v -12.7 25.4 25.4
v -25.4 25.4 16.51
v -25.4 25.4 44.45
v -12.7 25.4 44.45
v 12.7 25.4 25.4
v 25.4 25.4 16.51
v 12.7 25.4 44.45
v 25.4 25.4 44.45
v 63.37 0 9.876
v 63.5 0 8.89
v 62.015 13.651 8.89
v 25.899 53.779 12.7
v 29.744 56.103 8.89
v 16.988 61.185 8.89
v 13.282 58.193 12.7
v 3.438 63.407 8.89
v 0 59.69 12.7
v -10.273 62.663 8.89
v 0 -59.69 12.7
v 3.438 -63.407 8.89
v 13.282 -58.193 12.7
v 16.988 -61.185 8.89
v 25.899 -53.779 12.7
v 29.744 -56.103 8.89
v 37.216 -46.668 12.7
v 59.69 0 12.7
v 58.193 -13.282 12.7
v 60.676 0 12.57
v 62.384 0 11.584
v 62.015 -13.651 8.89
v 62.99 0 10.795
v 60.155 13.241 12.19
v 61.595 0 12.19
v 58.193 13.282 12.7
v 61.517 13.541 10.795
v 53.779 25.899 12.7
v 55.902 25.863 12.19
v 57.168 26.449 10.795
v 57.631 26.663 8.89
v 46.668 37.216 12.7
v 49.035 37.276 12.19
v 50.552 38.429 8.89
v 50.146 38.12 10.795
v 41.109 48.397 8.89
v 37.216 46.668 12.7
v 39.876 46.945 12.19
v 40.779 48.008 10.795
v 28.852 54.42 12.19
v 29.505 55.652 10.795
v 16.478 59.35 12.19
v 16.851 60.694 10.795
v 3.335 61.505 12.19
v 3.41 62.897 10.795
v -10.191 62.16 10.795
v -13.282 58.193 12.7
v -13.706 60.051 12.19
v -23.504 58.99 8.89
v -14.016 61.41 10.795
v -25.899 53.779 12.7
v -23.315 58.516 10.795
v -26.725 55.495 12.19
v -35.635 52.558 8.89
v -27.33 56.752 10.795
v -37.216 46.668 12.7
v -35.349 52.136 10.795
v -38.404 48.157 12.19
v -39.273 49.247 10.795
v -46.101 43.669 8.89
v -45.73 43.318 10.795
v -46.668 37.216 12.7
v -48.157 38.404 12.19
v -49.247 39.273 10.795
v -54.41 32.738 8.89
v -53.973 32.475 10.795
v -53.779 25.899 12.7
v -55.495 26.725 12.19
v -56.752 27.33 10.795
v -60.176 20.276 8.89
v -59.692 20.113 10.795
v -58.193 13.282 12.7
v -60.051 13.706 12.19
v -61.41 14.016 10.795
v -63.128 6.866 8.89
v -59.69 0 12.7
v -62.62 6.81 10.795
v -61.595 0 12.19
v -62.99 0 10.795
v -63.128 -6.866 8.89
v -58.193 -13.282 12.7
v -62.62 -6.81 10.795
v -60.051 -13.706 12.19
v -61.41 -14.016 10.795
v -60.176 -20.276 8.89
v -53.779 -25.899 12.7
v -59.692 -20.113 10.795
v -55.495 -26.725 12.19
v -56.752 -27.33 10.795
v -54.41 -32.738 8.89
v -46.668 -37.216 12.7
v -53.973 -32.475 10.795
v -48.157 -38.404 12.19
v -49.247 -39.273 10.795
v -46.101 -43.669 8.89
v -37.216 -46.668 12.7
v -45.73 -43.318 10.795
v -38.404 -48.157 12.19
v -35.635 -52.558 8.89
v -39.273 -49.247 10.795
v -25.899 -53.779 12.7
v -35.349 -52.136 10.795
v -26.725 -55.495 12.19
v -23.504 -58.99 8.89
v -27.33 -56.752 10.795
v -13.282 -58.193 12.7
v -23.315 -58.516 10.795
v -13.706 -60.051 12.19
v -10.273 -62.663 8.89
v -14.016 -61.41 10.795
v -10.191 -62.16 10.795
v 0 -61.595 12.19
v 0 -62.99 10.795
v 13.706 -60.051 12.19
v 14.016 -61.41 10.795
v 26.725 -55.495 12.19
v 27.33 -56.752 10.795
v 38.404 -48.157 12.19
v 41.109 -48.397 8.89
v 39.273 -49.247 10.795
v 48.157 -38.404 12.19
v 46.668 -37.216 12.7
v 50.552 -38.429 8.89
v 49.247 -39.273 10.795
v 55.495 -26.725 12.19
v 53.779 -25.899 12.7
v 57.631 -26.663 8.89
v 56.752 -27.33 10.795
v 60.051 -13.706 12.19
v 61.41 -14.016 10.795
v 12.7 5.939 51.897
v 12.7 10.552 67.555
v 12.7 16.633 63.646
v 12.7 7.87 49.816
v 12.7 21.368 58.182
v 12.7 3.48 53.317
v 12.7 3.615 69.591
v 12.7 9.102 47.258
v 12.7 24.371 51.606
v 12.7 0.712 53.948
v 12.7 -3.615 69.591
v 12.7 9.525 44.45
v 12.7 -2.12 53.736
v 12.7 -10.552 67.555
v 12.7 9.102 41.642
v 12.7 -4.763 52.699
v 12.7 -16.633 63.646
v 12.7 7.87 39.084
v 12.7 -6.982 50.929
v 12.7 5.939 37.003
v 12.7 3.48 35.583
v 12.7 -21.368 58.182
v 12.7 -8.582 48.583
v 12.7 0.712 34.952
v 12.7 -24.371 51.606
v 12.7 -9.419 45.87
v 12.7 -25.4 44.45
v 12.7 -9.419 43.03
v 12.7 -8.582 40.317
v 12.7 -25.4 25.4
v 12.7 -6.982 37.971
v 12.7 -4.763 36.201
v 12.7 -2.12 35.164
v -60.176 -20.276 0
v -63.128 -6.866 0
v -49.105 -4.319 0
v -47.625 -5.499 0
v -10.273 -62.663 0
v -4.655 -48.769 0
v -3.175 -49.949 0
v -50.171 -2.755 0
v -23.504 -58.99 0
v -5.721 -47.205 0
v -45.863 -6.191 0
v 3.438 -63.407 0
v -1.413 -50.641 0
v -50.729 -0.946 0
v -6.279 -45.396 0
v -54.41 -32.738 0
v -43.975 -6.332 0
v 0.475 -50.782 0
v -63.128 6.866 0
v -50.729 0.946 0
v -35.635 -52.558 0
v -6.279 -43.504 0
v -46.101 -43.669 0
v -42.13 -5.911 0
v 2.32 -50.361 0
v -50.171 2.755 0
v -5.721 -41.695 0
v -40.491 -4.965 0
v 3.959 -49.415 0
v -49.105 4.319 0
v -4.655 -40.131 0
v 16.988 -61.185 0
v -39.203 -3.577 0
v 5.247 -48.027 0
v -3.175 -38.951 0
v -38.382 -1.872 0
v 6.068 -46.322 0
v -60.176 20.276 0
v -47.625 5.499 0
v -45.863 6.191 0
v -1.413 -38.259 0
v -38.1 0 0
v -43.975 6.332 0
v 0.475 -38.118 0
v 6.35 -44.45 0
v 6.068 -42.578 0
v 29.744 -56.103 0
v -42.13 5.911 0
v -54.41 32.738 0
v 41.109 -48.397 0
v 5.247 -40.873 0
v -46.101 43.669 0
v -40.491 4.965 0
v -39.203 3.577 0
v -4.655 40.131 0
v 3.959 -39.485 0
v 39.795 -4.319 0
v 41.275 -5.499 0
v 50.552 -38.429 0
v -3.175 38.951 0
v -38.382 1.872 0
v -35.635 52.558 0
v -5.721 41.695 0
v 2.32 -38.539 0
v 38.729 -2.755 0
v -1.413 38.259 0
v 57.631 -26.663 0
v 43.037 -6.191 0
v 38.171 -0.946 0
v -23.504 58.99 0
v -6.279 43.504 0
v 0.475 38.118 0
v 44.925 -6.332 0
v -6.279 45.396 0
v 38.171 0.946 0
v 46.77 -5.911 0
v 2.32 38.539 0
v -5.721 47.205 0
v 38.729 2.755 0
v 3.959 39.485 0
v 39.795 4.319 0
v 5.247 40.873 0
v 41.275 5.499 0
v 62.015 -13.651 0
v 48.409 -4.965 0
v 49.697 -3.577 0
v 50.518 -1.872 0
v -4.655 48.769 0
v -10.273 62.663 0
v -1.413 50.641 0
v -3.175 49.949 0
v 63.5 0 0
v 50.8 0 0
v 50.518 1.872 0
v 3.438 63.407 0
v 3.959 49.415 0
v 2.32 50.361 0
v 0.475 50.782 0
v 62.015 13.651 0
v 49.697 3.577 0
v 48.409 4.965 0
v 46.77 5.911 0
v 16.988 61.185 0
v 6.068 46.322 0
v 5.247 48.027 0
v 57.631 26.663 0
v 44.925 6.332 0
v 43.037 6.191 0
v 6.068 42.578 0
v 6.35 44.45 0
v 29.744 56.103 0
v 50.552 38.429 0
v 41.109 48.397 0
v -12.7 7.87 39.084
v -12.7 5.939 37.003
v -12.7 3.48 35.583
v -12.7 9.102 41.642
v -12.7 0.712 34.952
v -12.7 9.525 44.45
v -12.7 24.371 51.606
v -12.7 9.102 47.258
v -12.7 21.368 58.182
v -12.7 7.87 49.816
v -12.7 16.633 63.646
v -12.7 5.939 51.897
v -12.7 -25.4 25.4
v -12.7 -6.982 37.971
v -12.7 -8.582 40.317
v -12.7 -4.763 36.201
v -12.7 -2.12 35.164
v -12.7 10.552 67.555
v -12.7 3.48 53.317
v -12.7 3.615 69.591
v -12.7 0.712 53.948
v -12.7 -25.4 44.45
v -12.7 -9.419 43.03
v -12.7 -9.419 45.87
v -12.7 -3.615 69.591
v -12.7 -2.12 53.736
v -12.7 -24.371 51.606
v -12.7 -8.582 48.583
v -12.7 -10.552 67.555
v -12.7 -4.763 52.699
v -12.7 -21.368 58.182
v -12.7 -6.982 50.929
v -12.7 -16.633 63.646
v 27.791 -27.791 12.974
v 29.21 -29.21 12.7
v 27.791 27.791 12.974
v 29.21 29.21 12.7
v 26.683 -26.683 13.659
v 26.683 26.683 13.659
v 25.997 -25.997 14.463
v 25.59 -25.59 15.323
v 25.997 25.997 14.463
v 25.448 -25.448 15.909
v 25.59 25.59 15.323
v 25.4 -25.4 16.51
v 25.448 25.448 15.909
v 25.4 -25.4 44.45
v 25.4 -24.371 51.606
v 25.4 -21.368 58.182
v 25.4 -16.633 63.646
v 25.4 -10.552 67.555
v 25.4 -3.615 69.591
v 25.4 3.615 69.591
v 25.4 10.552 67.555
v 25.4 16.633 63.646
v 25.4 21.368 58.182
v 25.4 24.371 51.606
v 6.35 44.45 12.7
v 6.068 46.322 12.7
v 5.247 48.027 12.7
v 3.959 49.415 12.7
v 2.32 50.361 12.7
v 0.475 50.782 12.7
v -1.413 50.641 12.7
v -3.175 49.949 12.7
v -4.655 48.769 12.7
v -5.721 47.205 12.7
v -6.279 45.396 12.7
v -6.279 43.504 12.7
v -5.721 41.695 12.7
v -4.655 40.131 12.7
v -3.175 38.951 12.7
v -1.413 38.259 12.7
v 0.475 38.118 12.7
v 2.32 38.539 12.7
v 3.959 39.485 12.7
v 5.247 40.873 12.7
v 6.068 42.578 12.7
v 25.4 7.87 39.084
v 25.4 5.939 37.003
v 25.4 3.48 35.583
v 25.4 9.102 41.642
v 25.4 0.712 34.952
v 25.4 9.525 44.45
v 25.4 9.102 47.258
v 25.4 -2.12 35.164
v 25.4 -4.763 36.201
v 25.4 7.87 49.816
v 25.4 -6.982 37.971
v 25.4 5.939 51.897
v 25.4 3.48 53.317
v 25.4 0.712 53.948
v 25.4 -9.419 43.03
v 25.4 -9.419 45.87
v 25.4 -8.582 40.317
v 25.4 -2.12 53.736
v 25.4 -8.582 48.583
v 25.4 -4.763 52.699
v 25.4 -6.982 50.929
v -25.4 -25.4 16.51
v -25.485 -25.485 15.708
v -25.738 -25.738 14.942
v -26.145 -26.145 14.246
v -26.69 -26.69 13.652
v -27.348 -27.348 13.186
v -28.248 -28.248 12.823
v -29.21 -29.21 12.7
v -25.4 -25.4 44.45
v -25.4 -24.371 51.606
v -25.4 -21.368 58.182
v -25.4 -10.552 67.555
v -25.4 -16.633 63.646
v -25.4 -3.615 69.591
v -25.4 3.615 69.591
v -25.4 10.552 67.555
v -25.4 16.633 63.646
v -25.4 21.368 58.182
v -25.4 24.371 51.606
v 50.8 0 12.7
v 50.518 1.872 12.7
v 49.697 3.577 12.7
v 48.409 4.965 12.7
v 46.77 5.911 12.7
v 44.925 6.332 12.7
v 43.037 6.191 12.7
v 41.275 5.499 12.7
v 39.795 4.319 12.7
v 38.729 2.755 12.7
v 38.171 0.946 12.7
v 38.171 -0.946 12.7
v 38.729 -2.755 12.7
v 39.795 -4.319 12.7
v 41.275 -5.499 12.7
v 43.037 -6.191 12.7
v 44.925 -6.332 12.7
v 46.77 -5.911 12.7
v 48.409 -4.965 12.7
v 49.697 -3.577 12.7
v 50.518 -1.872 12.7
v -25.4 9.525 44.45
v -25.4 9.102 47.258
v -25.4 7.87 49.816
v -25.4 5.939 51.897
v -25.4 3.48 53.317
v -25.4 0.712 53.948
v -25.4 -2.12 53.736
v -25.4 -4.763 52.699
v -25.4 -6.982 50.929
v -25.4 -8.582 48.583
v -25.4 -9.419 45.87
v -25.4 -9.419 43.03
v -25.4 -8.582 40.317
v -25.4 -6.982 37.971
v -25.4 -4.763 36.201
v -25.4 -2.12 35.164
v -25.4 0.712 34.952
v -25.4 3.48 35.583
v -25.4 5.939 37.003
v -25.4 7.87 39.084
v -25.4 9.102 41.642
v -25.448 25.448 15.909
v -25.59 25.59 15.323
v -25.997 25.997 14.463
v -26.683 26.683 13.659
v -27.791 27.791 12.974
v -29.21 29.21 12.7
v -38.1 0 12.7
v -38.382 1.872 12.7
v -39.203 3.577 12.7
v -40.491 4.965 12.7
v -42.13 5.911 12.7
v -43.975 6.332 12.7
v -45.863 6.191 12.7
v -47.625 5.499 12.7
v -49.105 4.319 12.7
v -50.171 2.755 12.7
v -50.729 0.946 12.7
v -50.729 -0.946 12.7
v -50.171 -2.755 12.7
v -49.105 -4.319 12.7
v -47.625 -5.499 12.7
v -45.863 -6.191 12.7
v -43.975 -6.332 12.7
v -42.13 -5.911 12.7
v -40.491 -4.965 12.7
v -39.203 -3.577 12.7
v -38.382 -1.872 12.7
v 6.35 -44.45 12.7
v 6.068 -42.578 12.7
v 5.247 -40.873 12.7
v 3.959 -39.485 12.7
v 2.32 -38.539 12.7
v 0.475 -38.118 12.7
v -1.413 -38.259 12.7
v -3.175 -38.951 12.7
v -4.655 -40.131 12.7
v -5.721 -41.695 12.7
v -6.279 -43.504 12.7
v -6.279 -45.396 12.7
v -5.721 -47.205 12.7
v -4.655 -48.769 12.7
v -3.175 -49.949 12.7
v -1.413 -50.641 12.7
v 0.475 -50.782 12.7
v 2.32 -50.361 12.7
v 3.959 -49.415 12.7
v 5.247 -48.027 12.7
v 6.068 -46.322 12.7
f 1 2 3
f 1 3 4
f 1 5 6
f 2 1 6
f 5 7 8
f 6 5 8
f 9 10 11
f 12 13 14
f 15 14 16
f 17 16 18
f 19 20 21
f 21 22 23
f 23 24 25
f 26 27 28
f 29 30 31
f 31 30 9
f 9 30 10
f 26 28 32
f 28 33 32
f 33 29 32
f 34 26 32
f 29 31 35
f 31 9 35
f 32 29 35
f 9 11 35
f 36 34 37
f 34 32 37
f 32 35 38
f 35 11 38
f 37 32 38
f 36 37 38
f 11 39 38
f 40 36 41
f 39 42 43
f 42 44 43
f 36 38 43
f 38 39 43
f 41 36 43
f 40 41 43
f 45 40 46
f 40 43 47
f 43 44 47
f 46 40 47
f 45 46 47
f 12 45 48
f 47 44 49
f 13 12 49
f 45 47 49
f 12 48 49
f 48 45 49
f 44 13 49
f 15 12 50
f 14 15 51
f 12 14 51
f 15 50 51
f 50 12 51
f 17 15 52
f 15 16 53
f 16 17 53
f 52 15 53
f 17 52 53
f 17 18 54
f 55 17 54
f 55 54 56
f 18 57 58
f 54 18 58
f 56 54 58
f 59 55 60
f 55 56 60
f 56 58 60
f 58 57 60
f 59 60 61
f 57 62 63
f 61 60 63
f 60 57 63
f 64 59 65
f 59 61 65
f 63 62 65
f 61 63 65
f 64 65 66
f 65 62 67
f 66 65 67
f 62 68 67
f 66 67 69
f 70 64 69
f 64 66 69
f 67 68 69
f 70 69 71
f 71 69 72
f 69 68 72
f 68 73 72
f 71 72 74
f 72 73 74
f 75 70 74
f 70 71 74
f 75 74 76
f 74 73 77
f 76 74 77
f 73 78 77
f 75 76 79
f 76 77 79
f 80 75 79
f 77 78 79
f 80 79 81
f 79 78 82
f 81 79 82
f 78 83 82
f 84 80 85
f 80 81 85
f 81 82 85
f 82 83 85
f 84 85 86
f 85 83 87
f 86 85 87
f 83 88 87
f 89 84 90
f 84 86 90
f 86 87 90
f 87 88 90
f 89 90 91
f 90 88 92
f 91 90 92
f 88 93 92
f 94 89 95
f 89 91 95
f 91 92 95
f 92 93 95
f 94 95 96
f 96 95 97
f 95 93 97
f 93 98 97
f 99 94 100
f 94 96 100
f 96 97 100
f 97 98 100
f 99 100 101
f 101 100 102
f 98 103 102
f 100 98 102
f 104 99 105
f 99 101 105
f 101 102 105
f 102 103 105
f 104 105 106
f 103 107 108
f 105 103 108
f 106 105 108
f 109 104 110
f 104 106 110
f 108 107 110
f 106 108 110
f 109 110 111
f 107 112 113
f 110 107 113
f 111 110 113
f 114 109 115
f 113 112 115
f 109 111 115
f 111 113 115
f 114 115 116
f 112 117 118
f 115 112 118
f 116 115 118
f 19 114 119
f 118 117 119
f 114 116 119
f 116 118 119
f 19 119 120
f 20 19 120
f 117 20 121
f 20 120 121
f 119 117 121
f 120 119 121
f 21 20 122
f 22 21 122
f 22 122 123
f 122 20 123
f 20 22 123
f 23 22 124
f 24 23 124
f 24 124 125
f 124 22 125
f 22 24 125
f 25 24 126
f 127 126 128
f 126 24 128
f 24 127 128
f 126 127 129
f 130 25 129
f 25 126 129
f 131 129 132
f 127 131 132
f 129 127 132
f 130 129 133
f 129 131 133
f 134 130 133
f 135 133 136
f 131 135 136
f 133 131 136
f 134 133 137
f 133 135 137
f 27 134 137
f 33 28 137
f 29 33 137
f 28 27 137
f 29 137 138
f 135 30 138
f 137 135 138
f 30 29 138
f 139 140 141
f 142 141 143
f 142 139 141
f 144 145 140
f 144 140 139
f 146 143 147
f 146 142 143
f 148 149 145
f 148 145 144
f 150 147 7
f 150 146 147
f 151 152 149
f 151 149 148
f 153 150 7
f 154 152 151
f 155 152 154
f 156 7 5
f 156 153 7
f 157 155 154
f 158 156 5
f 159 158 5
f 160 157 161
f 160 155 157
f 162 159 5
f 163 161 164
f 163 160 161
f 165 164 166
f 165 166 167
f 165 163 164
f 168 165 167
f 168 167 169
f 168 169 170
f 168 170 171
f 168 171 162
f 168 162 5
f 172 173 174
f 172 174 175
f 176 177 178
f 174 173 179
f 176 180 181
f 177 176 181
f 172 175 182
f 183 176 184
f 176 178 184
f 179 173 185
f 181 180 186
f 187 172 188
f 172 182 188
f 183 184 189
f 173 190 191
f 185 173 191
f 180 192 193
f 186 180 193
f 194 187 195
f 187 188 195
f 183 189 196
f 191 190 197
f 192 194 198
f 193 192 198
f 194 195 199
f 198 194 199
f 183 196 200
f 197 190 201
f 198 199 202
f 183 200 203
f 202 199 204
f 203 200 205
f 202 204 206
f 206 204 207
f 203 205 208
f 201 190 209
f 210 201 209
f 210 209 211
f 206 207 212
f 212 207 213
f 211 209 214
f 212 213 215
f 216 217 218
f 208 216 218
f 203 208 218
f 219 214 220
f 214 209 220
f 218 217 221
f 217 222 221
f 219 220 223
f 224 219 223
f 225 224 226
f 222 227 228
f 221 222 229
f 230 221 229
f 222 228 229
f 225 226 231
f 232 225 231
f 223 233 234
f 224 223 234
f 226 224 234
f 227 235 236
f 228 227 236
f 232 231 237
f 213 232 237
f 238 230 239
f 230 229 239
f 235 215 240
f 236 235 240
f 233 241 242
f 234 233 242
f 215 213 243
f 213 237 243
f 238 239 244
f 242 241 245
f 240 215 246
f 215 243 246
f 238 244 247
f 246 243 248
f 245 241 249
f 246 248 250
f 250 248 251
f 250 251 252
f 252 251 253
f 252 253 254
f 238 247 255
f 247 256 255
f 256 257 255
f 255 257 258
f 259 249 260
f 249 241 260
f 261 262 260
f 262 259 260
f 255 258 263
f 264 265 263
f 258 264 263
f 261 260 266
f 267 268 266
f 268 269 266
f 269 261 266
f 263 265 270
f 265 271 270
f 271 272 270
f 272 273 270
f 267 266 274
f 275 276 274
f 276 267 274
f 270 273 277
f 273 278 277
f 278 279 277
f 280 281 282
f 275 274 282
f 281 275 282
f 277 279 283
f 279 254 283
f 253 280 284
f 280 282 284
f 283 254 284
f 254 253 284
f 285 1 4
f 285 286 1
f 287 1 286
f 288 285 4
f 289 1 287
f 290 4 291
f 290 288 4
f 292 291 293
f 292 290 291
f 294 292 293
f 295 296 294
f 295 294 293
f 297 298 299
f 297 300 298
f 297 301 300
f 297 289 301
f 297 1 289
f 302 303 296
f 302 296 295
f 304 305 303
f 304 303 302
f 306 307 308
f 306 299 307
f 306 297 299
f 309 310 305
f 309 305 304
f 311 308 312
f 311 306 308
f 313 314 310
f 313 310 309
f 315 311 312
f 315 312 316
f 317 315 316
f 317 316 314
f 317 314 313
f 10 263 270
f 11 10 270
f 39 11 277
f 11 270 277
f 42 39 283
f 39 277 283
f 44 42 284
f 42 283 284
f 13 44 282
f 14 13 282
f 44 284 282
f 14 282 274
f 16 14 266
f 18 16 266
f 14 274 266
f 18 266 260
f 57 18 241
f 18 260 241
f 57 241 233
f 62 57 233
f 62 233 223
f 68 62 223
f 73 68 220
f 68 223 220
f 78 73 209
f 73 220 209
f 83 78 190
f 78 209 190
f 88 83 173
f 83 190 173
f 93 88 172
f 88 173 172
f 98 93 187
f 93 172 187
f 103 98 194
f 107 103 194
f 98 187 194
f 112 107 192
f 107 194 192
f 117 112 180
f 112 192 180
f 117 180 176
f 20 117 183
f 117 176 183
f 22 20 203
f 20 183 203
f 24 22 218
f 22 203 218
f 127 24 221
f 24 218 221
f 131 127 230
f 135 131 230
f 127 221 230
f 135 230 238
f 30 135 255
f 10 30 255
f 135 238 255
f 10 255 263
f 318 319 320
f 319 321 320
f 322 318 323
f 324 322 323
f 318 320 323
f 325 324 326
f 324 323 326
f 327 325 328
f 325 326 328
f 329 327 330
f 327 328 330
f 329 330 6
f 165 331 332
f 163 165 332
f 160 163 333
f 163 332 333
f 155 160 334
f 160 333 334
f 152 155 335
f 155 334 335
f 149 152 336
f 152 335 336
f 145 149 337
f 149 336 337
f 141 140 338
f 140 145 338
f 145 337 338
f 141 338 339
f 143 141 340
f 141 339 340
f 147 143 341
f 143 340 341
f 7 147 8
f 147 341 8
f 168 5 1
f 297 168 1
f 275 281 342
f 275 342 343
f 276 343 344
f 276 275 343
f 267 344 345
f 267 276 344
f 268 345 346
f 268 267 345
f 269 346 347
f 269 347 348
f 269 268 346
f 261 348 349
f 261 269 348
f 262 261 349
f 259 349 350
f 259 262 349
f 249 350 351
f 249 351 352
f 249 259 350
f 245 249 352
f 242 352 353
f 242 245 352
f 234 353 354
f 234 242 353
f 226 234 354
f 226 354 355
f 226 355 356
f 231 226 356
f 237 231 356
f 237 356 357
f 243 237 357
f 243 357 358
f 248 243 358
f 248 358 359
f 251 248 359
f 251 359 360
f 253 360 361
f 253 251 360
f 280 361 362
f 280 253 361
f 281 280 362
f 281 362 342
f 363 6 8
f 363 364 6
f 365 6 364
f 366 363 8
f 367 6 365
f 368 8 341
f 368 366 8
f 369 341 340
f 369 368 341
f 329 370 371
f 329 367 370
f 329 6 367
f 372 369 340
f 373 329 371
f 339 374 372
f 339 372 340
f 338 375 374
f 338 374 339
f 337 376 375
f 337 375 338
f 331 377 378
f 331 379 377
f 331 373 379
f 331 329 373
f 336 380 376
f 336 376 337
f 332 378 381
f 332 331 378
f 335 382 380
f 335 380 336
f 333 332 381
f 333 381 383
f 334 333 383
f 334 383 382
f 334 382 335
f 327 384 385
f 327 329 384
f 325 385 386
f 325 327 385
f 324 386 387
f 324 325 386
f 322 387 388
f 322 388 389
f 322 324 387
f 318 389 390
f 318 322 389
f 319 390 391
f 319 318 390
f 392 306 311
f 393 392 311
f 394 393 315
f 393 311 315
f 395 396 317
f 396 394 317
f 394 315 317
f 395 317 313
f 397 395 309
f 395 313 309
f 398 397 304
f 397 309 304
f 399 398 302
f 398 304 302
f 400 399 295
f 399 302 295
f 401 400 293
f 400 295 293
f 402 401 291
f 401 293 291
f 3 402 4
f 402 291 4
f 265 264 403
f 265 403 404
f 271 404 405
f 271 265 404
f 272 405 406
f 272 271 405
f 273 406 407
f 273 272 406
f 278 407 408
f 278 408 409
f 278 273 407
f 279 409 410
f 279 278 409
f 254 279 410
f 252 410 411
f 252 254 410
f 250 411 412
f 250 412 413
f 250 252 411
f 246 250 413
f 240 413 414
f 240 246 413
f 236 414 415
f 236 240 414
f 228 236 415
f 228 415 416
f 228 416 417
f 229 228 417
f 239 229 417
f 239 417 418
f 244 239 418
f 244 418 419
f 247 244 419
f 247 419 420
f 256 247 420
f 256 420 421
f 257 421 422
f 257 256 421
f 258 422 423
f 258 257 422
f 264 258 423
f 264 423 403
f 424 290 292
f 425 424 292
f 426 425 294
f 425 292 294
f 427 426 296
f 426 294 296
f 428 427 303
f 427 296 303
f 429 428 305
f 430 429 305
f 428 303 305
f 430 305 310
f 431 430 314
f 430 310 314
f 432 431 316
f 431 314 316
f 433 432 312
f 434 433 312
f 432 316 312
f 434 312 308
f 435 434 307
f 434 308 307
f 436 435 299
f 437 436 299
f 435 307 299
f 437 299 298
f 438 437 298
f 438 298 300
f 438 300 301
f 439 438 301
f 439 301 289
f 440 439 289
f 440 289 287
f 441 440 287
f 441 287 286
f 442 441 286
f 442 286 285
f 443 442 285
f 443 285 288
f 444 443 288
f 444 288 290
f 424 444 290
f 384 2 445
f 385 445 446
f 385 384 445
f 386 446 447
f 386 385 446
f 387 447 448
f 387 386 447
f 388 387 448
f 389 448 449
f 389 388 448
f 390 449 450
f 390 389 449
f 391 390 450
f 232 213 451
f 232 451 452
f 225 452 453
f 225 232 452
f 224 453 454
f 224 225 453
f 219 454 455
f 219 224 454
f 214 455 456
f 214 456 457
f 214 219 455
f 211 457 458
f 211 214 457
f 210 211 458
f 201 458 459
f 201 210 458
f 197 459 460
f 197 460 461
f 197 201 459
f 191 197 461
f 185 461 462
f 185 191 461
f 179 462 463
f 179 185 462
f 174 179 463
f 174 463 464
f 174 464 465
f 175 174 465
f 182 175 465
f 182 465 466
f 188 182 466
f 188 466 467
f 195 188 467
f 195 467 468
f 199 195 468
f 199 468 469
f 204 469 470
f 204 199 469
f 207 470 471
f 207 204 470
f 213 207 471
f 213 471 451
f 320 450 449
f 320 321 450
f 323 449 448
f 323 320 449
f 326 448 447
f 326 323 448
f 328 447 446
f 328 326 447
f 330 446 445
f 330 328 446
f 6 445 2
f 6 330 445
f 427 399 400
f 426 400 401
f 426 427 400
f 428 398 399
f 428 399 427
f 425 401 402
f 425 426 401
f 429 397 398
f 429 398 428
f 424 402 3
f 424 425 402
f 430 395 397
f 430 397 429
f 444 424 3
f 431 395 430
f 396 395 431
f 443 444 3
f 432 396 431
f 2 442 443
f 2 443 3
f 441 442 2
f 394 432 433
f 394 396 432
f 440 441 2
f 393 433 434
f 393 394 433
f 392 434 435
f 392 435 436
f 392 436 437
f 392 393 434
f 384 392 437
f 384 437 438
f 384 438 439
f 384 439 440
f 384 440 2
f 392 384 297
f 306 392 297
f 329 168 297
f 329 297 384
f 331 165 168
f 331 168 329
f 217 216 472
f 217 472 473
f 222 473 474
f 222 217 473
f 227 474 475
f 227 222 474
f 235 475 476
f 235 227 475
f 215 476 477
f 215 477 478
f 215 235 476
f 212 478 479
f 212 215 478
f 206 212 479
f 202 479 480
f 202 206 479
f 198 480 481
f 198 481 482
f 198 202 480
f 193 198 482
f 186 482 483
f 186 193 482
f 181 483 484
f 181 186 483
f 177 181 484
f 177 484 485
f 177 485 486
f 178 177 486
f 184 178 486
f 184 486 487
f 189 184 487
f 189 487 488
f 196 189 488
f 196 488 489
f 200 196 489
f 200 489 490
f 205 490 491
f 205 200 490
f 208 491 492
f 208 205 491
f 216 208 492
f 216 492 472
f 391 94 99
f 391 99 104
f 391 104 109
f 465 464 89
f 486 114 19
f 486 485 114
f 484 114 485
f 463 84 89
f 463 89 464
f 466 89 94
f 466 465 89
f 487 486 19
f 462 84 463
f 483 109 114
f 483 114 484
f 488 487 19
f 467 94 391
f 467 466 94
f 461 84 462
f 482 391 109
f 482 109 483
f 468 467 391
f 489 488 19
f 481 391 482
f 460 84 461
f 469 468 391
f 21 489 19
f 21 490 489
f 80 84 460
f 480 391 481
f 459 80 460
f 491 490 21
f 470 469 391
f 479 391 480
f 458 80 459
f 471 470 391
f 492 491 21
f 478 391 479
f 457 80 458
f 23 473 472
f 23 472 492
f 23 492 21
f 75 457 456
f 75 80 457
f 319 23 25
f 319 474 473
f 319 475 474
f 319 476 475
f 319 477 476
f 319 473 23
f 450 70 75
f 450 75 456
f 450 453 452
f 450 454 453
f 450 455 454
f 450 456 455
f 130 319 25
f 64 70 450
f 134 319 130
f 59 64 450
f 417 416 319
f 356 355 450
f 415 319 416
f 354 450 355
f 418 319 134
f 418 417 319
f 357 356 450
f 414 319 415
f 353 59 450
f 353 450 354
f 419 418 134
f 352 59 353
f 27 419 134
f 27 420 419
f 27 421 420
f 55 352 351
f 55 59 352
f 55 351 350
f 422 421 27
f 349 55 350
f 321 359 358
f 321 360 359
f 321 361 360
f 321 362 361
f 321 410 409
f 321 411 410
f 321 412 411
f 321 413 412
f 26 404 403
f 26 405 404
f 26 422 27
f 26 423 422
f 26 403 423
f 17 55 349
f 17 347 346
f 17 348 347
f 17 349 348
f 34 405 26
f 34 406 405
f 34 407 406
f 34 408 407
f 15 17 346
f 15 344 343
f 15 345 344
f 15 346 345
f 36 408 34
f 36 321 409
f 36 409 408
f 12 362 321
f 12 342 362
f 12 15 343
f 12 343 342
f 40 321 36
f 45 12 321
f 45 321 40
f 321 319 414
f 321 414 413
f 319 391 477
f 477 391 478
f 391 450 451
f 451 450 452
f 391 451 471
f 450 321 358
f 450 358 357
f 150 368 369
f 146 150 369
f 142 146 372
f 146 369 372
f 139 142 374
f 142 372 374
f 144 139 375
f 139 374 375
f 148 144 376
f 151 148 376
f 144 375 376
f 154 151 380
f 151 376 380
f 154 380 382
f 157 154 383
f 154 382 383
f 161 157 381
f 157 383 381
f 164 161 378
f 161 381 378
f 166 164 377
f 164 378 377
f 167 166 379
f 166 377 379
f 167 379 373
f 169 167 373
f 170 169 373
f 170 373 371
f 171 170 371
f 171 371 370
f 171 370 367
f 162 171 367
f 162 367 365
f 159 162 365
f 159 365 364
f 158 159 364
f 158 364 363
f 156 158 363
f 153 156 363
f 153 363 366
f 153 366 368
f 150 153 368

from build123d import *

# Parameters (mm, degrees)
F0_R     = 63.5
F0_R_2   = 6.35
F1_DEPTH = 12.7
F3_DEPTH = 25.4
F5_DEPTH = 88.901
F4_R     = 9.525
F6_DEPTH = 88.901
F7_R     = 3.81


with BuildPart() as f1:
    # F0 (on Top) → F1 (new body)
    with BuildSketch(Plane.XY):
        Circle(F0_R)
        with Locations((0, -44.45)):
            Circle(F0_R_2, mode=Mode.SUBTRACT)
        with Locations((-44.45, 0)):
            Circle(F0_R_2, mode=Mode.SUBTRACT)
        with Locations((44.45, 0)):
            Circle(F0_R_2, mode=Mode.SUBTRACT)
        with Locations((0, 44.45)):
            Circle(F0_R_2, mode=Mode.SUBTRACT)
    extrude(amount=F1_DEPTH)

    # F2 (on Front) → F3 (join, symmetric)
    with BuildSketch(Plane.XZ):
        Polygon((-25.4, 76.2), (-25.4, 0), (25.4, 0), (25.4, 76.2), (12.7, 76.2), (12.7, 25.4), (-12.7, 25.4), (-12.7, 76.2), align=None)
    extrude(amount=F3_DEPTH, both=True)

    # F4 (on face) → F5 (cut, through all)
    with BuildSketch(Plane.YZ.offset(25.4)):
        with BuildLine():
            ThreePointArc((-25.4, 44.45), (0, 69.85), (25.4, 44.45))
            Line((25.4, 44.45), (25.4, 76.2))
            Line((25.4, 76.2), (-25.4, 76.2))
            Line((-25.4, 76.2), (-25.4, 44.45))
        make_face()
    extrude(amount=-F5_DEPTH, mode=Mode.SUBTRACT)

    # F4 (on face) → F6 (cut, through all)
    with BuildSketch(Plane.YZ.offset(25.4)):
        with Locations((0, 44.45)):
            Circle(F4_R)
    extrude(amount=-F6_DEPTH, mode=Mode.SUBTRACT)

    # F7
    f7_edges = [f1.edges().sort_by_distance(p)[0] for p in [
        (-63.5, 0, 12.7),
        (25.4, 0, 12.7),
        (0, -25.4, 12.7),
        (0, 25.4, 12.7),
        (-25.4, 0, 12.7),
    ]]
    fillet(f7_edges, radius=F7_R)


solid = f1.part
